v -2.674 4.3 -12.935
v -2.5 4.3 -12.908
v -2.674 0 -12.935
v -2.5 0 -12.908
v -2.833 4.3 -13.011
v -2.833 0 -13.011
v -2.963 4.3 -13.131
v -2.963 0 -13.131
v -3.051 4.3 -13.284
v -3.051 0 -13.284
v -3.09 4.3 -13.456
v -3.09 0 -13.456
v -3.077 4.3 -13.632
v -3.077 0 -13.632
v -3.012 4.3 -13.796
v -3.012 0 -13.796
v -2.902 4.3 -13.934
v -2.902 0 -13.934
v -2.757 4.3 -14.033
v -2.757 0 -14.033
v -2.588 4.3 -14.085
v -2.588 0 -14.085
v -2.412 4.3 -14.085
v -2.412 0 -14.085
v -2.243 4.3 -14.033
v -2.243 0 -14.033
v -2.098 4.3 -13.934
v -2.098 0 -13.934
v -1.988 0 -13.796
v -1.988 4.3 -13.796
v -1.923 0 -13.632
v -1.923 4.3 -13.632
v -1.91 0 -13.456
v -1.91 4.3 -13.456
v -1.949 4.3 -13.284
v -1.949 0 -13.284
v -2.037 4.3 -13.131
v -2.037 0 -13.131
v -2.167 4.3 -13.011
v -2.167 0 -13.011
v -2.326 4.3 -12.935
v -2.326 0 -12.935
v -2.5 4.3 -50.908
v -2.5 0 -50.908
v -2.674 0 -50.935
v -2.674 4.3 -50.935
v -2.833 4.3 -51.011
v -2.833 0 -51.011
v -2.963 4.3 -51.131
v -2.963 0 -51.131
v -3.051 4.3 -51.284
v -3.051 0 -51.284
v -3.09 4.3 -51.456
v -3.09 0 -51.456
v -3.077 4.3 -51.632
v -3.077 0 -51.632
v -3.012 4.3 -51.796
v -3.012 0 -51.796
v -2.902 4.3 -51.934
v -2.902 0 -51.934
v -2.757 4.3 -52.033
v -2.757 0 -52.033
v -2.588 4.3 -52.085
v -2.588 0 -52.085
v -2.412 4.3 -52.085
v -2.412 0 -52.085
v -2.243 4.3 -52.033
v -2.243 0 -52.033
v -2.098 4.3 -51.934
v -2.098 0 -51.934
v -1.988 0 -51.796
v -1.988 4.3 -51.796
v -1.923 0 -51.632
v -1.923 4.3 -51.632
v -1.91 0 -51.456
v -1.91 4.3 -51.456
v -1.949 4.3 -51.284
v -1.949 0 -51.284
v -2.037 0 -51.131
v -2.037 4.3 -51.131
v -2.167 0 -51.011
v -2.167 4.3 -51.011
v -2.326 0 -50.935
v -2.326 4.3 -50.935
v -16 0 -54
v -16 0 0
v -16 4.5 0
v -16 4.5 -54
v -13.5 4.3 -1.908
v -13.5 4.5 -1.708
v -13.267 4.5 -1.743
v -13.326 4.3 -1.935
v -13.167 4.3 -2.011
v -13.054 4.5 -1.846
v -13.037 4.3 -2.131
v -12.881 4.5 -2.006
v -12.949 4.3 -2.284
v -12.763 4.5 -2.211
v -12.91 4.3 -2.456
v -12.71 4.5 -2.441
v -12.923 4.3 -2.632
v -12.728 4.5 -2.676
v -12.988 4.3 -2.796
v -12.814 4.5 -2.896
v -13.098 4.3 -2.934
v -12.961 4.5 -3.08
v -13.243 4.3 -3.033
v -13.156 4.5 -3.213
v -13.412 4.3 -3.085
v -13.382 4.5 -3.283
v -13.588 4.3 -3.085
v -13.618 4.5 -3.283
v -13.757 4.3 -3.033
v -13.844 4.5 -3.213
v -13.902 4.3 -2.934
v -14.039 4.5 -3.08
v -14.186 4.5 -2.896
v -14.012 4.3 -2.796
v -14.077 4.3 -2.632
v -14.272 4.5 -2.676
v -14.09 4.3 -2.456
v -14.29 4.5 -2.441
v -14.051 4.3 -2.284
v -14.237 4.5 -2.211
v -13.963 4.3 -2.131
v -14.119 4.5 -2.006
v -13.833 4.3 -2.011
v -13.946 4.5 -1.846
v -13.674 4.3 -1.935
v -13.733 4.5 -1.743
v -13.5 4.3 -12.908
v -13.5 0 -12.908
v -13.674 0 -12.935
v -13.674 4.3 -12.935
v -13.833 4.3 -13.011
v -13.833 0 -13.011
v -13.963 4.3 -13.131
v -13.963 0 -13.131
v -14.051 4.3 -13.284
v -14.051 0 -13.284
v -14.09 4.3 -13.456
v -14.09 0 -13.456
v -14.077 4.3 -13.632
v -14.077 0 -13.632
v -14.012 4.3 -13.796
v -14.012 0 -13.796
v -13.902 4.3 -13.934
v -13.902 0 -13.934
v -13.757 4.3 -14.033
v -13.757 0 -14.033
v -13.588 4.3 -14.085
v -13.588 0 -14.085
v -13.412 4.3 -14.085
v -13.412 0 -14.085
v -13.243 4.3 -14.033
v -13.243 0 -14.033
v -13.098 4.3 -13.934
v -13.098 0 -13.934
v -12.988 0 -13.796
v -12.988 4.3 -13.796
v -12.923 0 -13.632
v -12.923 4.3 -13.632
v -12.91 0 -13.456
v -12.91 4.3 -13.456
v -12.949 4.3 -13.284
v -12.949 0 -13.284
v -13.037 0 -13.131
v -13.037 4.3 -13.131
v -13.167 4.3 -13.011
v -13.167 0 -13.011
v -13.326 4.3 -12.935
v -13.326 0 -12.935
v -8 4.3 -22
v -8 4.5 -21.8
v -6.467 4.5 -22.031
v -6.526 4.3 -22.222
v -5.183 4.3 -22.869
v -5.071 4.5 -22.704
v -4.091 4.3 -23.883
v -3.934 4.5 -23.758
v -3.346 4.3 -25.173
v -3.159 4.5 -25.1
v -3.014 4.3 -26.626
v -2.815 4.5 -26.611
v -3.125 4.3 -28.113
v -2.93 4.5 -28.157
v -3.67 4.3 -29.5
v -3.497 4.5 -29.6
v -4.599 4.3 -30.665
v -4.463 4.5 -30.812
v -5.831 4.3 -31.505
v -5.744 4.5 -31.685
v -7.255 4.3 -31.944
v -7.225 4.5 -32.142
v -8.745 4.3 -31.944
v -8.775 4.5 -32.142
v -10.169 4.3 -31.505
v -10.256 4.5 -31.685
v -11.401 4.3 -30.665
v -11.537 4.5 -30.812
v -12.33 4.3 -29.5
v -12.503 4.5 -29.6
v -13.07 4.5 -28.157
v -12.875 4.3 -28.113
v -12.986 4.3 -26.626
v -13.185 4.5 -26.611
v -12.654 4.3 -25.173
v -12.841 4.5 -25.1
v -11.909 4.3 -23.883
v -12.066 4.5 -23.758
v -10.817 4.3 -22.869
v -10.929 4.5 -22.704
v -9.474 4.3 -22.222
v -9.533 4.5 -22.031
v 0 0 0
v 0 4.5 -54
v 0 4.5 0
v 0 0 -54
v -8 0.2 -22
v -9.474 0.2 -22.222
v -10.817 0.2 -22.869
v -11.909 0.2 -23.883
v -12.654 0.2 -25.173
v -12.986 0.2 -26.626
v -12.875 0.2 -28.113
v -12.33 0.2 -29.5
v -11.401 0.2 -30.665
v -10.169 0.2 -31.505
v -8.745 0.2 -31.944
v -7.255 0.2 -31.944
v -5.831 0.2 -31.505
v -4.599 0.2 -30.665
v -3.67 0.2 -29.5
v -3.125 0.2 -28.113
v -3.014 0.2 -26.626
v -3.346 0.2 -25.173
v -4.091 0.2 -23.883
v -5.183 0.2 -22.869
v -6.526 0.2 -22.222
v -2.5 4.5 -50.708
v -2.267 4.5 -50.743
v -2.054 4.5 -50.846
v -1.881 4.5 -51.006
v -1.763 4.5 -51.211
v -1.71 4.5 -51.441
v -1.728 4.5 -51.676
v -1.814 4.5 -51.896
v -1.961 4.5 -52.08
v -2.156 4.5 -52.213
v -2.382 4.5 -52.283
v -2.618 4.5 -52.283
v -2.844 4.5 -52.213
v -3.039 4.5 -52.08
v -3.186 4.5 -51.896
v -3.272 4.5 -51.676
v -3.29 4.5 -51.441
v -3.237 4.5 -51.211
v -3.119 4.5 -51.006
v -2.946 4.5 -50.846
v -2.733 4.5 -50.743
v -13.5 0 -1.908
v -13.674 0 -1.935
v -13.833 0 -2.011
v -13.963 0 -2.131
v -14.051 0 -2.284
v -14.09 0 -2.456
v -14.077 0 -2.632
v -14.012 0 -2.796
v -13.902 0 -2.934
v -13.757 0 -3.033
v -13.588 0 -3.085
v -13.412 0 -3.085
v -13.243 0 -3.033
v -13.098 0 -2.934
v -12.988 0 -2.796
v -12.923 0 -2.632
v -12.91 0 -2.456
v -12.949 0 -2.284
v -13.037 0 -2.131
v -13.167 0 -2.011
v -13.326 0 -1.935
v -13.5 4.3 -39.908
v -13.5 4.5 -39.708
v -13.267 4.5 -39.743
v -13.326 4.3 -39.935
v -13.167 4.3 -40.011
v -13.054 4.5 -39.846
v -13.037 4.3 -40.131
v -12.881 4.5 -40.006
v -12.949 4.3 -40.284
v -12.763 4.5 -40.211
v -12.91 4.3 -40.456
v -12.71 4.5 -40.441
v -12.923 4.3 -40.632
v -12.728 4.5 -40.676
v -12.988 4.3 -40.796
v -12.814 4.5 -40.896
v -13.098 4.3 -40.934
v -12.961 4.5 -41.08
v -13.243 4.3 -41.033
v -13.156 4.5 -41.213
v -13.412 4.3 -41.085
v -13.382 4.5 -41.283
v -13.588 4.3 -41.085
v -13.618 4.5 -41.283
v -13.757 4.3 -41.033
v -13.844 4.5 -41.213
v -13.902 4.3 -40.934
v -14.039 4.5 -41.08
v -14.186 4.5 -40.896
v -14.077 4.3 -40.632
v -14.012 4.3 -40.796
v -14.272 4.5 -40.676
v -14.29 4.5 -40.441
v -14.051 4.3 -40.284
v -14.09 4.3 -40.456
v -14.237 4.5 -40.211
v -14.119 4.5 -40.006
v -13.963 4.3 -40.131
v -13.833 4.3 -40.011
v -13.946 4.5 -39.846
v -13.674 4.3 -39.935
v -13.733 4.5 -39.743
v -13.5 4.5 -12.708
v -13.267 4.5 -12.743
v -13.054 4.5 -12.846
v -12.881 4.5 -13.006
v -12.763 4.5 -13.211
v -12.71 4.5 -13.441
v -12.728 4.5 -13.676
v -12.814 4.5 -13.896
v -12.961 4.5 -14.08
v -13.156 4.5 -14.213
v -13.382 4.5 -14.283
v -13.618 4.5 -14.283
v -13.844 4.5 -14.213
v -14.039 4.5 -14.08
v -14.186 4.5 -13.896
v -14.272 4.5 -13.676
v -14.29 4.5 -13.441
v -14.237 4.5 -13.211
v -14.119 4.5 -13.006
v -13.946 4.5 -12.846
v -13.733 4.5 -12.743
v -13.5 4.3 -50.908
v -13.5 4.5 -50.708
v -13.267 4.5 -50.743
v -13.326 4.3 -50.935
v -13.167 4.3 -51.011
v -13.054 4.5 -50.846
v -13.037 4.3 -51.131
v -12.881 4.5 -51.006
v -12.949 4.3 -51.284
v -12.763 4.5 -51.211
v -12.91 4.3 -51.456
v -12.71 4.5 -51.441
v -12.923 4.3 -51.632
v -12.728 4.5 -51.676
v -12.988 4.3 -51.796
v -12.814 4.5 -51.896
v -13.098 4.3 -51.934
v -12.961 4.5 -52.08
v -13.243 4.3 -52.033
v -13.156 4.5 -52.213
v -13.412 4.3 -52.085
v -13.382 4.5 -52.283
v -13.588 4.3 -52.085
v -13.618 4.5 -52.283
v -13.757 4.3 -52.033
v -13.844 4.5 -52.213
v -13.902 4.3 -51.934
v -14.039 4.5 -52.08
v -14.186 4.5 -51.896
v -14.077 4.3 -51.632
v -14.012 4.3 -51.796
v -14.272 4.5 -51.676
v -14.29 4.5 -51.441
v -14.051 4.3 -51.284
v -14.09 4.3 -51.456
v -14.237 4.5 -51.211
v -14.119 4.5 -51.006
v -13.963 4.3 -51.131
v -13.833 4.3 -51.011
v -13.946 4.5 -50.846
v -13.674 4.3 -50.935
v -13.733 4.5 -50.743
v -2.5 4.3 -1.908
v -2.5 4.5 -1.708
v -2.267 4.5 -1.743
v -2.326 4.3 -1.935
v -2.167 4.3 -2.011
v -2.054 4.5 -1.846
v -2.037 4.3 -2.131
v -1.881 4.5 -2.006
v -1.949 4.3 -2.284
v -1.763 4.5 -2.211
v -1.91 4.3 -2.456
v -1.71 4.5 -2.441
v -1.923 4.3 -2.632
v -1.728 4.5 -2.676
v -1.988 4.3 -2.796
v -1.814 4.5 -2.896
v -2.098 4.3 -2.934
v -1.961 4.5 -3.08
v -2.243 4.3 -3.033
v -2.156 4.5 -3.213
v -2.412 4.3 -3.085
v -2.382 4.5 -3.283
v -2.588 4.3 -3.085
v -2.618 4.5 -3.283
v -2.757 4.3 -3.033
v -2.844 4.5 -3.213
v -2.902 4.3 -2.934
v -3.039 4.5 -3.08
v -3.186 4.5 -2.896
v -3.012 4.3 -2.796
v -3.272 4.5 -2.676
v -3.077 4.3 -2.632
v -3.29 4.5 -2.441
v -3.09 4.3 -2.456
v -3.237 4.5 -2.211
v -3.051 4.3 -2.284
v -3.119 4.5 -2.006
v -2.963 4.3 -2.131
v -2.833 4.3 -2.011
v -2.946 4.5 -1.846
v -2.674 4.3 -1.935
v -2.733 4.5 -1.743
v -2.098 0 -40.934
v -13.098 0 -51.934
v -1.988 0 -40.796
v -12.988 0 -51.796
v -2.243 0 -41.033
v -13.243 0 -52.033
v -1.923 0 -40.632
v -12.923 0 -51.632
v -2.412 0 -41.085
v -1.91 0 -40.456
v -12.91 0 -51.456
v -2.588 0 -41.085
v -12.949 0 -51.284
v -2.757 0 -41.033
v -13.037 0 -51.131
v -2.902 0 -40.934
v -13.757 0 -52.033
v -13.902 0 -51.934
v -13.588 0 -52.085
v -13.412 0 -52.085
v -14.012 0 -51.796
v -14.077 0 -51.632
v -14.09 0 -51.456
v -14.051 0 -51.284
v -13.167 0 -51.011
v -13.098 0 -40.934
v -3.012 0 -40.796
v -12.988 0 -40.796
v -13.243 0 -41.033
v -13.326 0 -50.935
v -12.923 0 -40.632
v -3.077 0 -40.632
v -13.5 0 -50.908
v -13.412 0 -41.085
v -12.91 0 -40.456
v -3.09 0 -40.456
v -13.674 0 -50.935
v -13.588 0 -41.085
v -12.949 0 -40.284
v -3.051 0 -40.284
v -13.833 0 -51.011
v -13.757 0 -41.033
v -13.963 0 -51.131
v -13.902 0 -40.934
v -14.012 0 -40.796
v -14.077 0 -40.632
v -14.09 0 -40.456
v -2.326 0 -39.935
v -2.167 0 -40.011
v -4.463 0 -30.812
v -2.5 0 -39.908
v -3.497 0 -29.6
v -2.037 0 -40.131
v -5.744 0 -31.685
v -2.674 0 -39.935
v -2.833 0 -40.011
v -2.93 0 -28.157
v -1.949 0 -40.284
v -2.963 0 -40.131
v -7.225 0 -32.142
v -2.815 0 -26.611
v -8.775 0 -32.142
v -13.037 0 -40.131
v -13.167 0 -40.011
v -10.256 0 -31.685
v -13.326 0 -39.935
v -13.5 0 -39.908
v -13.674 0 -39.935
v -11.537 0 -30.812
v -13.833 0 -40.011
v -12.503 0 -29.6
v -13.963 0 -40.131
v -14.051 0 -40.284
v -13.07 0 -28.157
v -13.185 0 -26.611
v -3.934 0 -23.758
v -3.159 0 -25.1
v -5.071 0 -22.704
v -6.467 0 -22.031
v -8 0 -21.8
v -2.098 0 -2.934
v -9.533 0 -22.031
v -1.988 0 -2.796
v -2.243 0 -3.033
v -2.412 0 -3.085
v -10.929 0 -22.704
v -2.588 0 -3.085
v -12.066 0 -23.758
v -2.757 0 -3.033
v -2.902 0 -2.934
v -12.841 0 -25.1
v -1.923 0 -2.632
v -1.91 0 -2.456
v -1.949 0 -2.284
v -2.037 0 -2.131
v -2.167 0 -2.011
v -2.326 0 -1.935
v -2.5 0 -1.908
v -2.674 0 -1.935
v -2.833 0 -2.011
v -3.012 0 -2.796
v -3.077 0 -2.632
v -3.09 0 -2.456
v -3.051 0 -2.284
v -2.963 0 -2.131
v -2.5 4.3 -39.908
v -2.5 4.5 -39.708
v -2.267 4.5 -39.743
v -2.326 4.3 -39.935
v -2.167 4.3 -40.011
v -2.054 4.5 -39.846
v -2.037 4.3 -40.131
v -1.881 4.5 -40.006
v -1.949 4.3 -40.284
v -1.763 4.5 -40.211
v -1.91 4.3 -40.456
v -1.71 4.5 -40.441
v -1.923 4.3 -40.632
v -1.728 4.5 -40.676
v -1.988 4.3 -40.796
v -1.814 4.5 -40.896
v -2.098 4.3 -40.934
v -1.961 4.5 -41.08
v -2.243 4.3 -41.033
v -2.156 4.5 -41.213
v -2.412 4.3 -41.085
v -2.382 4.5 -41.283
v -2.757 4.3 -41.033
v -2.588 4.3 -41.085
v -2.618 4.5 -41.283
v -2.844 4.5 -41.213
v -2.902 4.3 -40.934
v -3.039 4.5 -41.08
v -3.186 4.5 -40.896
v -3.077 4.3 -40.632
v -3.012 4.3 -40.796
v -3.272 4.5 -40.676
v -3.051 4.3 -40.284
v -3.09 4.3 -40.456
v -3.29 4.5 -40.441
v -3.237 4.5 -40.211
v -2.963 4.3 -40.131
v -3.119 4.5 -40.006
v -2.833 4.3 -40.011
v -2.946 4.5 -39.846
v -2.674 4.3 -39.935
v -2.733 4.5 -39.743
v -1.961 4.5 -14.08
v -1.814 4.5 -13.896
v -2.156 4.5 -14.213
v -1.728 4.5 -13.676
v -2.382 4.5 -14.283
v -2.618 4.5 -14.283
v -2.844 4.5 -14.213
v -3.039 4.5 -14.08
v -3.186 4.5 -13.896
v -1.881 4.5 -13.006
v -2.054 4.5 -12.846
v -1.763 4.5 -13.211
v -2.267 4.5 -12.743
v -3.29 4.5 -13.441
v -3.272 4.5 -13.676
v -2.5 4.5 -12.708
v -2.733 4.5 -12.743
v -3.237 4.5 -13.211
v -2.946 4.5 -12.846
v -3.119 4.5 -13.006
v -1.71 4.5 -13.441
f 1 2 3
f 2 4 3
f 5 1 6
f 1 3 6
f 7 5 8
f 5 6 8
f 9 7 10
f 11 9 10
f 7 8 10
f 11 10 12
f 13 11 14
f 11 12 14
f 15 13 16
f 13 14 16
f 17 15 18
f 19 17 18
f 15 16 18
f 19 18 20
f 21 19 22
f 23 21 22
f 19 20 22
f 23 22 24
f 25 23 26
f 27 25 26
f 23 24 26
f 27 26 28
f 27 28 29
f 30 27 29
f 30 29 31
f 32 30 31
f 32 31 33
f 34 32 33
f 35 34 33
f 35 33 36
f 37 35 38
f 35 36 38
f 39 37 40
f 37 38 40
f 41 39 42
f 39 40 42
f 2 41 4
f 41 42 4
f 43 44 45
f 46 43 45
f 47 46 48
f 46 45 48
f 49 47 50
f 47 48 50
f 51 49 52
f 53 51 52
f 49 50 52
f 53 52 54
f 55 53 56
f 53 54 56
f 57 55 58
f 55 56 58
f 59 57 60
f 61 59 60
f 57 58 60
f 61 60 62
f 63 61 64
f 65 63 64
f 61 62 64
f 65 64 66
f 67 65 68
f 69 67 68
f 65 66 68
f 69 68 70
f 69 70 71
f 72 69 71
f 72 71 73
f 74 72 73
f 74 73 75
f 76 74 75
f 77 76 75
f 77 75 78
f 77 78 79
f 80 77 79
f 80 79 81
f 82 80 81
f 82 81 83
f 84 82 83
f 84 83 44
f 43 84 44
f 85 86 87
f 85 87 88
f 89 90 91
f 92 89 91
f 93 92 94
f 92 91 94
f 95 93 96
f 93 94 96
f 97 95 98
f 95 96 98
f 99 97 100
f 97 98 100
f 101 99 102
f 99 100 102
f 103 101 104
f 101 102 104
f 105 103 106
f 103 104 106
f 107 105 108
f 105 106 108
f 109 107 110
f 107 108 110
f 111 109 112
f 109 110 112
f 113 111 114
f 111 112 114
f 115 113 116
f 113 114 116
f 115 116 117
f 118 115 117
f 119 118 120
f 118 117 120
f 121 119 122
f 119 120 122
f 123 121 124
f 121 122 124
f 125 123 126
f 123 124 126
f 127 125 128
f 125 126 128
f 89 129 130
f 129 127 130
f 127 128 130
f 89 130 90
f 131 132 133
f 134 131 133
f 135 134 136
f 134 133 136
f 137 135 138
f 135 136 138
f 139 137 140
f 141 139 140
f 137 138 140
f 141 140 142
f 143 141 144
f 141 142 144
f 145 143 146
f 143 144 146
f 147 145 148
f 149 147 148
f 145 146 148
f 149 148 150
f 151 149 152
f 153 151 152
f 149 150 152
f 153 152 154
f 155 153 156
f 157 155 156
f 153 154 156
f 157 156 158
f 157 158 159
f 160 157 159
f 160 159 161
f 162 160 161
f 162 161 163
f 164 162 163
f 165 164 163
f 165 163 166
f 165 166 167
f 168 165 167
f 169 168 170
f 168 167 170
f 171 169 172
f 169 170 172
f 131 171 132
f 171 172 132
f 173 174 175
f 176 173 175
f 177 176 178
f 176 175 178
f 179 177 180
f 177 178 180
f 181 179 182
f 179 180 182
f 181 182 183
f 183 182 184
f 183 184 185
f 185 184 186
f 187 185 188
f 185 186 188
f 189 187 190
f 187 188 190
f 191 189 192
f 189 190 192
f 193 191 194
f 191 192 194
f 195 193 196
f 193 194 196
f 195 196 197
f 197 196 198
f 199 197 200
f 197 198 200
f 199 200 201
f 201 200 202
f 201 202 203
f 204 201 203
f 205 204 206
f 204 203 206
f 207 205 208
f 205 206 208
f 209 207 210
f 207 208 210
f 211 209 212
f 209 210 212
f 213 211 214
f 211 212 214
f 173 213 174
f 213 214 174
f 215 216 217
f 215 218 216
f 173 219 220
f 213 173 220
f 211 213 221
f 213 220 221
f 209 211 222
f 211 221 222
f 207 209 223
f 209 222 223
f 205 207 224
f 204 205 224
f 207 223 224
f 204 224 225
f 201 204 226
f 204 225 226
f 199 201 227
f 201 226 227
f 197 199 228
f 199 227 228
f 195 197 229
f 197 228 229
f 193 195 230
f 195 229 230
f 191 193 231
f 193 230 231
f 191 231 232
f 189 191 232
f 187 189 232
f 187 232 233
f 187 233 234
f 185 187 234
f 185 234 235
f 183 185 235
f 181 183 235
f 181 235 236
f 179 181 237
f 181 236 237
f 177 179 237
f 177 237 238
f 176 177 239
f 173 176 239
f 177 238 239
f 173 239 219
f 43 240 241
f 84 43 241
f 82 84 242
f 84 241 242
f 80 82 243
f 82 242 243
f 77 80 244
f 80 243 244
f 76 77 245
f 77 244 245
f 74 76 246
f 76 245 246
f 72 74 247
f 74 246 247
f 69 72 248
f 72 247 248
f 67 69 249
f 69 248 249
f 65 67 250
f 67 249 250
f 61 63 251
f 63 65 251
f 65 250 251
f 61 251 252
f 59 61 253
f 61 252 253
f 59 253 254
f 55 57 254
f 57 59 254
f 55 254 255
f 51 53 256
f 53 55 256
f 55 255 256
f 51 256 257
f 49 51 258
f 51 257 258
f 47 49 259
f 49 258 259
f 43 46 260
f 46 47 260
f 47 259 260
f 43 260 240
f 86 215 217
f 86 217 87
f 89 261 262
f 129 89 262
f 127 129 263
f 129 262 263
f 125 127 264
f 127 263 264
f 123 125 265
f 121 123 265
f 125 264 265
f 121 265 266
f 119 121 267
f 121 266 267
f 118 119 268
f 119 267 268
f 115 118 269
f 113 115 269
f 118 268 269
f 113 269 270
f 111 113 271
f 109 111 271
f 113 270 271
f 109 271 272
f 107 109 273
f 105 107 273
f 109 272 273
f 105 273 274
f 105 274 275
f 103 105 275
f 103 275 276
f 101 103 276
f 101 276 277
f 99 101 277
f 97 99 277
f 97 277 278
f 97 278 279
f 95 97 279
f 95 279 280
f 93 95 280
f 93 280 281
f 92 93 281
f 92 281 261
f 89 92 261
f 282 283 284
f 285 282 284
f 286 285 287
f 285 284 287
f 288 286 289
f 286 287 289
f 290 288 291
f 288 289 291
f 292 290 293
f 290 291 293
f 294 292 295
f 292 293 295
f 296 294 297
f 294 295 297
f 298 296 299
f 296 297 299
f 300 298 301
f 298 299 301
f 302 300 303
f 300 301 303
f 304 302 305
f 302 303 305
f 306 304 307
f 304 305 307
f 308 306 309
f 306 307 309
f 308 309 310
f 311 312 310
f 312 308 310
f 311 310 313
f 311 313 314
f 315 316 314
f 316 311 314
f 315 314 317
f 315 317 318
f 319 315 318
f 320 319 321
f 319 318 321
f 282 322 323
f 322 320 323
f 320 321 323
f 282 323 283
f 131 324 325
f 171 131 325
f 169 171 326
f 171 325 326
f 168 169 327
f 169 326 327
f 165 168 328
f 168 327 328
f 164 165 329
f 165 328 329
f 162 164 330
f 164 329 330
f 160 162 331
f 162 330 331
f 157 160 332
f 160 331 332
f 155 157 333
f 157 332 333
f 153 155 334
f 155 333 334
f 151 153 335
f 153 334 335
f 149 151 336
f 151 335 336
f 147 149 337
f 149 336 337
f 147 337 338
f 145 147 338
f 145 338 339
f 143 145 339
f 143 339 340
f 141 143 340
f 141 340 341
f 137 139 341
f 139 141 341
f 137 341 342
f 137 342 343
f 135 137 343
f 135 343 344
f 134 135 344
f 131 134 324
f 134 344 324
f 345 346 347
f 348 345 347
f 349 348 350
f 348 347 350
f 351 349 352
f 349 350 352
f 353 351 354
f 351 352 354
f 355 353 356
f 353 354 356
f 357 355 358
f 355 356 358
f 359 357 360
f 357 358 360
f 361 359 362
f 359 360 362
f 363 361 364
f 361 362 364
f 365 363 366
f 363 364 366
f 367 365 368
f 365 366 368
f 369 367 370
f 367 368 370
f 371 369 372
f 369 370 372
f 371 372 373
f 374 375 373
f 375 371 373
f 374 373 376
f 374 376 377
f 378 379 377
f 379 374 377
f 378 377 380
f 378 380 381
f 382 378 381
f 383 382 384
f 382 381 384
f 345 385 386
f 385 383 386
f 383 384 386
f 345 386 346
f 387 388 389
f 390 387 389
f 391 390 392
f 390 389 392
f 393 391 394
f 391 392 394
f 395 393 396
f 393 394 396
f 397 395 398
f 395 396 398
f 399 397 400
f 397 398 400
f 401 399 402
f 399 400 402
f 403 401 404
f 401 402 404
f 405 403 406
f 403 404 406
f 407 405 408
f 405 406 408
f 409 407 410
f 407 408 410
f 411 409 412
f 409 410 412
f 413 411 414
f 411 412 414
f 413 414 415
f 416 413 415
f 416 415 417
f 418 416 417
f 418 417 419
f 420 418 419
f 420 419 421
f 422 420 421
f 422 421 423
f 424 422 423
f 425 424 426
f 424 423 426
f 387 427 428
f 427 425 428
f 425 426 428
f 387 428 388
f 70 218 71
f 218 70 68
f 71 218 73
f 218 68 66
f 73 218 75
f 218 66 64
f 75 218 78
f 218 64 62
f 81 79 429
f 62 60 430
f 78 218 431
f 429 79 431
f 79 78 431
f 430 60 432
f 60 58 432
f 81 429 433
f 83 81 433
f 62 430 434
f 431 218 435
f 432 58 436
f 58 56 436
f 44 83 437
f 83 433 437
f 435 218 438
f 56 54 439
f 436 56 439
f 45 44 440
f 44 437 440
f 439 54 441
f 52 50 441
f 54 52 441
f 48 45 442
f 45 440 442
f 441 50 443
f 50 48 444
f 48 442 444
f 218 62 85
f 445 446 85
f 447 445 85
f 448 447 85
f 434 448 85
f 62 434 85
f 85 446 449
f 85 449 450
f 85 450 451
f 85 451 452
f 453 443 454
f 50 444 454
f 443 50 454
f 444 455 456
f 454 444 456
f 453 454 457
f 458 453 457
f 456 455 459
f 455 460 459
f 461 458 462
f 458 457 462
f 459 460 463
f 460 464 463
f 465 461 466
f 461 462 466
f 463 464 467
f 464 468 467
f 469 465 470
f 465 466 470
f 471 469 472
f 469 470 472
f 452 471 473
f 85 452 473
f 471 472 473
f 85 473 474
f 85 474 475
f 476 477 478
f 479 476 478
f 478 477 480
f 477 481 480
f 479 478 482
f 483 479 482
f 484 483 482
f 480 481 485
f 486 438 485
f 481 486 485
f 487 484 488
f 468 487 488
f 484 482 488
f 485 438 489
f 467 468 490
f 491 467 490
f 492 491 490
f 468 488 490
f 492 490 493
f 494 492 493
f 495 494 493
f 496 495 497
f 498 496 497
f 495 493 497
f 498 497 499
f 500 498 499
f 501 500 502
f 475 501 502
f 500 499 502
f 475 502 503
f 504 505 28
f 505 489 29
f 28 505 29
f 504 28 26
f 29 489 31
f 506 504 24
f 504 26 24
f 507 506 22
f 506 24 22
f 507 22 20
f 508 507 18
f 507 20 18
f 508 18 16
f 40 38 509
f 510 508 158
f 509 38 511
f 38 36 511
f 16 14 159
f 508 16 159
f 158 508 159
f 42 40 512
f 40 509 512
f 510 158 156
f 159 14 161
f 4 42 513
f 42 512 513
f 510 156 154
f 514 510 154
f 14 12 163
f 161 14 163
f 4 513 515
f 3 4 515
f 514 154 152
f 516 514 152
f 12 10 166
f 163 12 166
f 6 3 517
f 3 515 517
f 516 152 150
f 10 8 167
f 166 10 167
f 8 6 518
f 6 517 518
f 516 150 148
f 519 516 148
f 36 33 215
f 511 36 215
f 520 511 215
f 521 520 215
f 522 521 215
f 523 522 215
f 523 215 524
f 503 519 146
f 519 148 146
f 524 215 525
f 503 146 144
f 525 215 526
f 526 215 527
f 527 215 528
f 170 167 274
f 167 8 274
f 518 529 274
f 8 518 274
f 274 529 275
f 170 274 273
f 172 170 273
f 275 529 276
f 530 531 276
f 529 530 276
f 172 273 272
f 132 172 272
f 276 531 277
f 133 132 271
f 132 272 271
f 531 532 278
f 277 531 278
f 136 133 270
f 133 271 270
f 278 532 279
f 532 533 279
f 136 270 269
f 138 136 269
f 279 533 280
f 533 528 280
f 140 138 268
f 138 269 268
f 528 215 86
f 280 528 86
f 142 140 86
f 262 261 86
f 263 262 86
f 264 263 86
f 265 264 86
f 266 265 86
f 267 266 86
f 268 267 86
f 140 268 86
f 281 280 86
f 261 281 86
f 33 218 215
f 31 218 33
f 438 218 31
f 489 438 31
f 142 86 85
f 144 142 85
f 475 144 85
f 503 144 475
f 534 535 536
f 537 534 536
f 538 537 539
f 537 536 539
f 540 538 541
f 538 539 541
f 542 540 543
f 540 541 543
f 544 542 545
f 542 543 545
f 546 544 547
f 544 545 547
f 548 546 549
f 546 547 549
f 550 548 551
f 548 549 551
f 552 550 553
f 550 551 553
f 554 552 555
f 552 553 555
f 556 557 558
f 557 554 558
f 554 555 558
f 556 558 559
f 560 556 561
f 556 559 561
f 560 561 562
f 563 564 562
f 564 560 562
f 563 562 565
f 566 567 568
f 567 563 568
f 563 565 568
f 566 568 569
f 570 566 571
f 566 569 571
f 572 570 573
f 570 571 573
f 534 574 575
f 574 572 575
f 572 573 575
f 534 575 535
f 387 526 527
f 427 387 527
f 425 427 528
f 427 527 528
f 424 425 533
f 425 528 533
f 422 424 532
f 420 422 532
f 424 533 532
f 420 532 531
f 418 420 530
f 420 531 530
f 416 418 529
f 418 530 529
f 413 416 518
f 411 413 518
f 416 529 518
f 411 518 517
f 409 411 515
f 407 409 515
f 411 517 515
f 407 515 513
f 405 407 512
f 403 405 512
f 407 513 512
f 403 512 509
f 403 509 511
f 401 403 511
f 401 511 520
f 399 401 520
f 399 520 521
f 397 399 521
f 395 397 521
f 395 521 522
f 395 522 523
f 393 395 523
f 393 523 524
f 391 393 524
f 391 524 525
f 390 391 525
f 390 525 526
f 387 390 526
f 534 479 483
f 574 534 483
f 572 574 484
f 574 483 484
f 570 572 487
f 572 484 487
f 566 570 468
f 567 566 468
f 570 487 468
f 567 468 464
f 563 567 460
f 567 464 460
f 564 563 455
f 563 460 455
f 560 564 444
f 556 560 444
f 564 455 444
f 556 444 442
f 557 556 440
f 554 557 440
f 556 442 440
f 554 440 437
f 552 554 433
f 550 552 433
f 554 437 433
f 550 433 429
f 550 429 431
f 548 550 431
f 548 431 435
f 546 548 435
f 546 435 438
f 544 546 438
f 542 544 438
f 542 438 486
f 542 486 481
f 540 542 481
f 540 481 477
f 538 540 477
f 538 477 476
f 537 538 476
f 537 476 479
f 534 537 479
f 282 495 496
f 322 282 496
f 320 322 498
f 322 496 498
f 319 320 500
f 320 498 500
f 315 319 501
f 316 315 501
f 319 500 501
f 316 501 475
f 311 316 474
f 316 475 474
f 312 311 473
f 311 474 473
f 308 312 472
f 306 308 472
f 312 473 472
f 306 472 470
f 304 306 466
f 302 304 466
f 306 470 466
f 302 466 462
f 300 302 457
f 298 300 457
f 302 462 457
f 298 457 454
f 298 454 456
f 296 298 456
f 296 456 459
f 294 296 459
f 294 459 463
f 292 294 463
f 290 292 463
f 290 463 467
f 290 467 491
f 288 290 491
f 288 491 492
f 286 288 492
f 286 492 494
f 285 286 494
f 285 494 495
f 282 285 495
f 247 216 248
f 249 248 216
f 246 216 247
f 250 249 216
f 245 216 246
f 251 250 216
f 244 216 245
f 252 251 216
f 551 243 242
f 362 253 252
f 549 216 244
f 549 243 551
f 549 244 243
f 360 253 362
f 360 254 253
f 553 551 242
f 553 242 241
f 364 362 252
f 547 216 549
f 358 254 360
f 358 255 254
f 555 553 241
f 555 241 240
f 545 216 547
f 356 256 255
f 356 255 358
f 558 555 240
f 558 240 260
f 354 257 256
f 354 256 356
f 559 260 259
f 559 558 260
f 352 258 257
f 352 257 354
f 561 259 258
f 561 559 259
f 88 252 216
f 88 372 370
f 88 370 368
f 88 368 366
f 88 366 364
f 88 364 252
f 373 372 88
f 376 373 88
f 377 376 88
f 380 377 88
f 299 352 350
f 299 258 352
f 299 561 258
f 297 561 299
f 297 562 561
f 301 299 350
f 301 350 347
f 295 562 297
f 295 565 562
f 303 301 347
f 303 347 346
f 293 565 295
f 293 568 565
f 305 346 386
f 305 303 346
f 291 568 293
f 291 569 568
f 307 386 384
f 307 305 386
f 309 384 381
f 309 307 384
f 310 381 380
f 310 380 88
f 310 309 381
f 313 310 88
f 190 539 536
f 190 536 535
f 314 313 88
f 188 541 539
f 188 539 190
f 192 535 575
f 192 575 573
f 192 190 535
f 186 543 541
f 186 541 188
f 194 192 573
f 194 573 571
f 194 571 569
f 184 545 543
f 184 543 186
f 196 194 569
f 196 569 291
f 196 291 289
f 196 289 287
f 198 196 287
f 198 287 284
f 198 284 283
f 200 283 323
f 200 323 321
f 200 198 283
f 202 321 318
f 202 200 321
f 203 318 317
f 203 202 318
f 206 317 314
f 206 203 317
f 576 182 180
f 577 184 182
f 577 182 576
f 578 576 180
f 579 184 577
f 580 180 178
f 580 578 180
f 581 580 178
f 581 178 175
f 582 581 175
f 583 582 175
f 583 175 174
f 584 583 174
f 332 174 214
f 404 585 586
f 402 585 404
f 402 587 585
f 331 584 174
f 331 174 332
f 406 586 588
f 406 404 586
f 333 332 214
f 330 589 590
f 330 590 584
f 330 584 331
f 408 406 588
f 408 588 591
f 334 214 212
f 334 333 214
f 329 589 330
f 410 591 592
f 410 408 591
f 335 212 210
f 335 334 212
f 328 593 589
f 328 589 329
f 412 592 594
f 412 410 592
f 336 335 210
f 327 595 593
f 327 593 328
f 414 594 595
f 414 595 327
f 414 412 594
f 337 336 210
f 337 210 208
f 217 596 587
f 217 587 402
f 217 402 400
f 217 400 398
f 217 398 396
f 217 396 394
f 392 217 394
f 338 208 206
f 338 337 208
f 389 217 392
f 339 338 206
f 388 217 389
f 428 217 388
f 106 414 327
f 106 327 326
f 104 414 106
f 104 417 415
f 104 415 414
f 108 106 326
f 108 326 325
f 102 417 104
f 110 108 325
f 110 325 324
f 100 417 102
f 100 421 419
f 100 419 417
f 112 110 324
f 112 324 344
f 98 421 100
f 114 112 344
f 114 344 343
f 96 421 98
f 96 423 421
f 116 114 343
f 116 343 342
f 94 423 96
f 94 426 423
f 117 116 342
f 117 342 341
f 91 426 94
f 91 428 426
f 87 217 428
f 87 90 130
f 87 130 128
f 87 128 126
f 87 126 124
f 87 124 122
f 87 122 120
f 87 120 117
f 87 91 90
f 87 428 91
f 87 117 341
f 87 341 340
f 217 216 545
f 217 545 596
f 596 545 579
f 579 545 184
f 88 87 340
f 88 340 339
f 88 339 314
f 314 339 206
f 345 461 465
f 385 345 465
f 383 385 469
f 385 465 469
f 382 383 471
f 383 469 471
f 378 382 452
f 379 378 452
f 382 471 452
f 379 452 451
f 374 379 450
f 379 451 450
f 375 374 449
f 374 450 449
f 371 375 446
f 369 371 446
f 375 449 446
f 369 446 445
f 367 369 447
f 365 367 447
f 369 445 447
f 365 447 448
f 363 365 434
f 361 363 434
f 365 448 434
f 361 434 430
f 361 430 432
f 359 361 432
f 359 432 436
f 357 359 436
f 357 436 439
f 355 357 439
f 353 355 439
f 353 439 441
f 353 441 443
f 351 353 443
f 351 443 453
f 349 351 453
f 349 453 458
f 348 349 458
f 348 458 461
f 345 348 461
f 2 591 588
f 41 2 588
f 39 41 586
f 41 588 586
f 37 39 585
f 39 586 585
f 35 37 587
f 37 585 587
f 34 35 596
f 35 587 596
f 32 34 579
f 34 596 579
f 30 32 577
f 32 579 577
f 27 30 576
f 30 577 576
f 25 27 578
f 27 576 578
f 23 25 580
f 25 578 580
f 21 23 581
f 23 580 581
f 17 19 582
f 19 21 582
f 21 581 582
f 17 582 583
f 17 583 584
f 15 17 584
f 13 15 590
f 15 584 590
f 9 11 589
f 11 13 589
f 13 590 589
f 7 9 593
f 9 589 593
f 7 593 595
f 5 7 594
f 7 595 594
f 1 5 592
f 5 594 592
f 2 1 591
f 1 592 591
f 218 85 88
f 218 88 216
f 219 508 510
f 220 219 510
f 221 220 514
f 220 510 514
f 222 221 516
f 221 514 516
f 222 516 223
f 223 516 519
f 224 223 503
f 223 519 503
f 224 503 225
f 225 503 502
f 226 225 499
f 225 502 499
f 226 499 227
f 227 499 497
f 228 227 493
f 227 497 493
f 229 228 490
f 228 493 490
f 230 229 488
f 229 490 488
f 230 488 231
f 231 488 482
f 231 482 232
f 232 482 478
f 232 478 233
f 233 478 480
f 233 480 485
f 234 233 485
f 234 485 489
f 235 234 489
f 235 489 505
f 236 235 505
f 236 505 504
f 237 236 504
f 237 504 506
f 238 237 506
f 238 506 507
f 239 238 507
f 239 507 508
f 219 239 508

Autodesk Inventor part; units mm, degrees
ref_plane "YZ Plane" through (0, 0, 0) normal (1, 0, 0) x (0, 1, 0)
ref_plane "XZ Plane" through (0, 0, 0) normal (0, 1, 0) x (-1, 0, 0)
ref_plane "XY Plane" through (0, 0, 0) normal (0, 0, 1) x (1, 0, 0)
sketch "Sketch1" plane through (0, 0, 0) normal (0, 1, 0) x (-1, 0, 0)
  line L0 (0, 0) -> (16, 0)
  line L1 (16, 0) -> (16, -54)
  line L2 (16, -54) -> (0, -54)
  line L3 (0, -54) -> (0, 0)
  dimension "d0" = 16
  dimension "d1" = 54
extrude "Extrusion1" add sketch "Sketch1" along normal blind 4.5
sketch "Sketch2" plane through (0, 4.5, 0) normal (0, 1, 0) x (1, 0, 0)
  line L0 (-16, 0) -> (0, 0) projected
  line L1 (0, 0) -> (0, 54) projected
  line L2 (0, 54) -> (-16, 54) projected
  line L3 (-16, 54) -> (-16, 0) projected
  line L4 (-16, 0) -> (0, 0) projected
  line L5 (0, 0) -> (0, 54) projected
  line L6 (-16, 0) -> (0, 54) construction
  line L7 (-16, 54) -> (-16, 0) construction
  line L8 (-16, 54) -> (0, 0) construction
  point P0 (-8, 27)
  point P1 (-8, 27)
hole "Hole1" at (-8, 4.5, -27) direction (0, -1, 0) diameter 10 end through all
chamfer "Chamfer1" distance 0.2 angle 45 2 edges at (-8, 0, -32) (-8, 4.5, -32)
sketch "Sketch3" plane through (0, 4.5, 0) normal (0, 1, 0) x (1, 0, 0)
  line L0 (0, 38) -> (-16, 38) construction
  line L1 (-16, 38) -> (-16, 54) construction
  line L2 (-16, 54) -> (0, 54) construction
  line L3 (0, 54) -> (0, 38) construction
  line L4 (0, 38) -> (-16, 54) construction
  line L5 (-16, 38) -> (0, 54) construction
  line L6 (-2.5, 51.5) -> (-13.5, 51.5) construction
  line L7 (-13.5, 51.5) -> (-13.5, 40.5) construction
  line L8 (-13.5, 40.5) -> (-2.5, 40.5) construction
  line L9 (-2.5, 40.5) -> (-2.5, 51.5) construction
  line L10 (-2.5, 51.5) -> (-13.5, 40.5) construction
  line L11 (-13.5, 51.5) -> (-2.5, 40.5) construction
  line L12 (0, 54) -> (-16, 54) construction
  line L13 (-16, 54) -> (-16, 0) construction
  line L14 (-16, 0) -> (0, 0) construction
  line L15 (0, 0) -> (0, 54) construction
  circle A0 centre (-8, 27) radius 5.2 construction
  line L16 (-16, 27) -> (0, 27) construction
  point P0 (-8, 46)
  point P1 (-2.5, 13.5)
  point P2 (-13.5, 13.5)
  point P3 (-13.5, 2.5)
  point P4 (-2.5, 2.5)
  dimension "d16" = 16
  dimension "d17" = 16
  dimension "d18" = 11
  dimension "d19" = 11
hole "Hole2" at (-2.5, 4.5, -40.5) at (-13.5, 4.5, -40.5) at (-13.5, 4.5, -51.5) at (-2.5, 4.5, -51.5) at (-13.5, 4.5, -2.5) at (-13.5, 4.5, -13.5) at (-2.5, 4.5, -13.5) at (-2.5, 4.5, -2.5) direction (0, -1, 0) diameter 1.1835 end through all thread size "M1.4x0.3" class "6H" standard "ISO Metric profile"
chamfer "Chamfer2" distance 0.2 angle 45 8 edges at (-2.5, 4.5, -52.0917) (-2.5, 4.5, -41.0917) (-13.5, 4.5, -52.0917) (-13.5, 4.5, -41.0917) (-2.5, 4.5, -14.0917) (-2.5, 4.5, -3.0917) (-13.5, 4.5, -14.0917) (-13.5, 4.5, -3.0917)
properties part number "KN-00-02-01" material "X5CrNi18-10"
